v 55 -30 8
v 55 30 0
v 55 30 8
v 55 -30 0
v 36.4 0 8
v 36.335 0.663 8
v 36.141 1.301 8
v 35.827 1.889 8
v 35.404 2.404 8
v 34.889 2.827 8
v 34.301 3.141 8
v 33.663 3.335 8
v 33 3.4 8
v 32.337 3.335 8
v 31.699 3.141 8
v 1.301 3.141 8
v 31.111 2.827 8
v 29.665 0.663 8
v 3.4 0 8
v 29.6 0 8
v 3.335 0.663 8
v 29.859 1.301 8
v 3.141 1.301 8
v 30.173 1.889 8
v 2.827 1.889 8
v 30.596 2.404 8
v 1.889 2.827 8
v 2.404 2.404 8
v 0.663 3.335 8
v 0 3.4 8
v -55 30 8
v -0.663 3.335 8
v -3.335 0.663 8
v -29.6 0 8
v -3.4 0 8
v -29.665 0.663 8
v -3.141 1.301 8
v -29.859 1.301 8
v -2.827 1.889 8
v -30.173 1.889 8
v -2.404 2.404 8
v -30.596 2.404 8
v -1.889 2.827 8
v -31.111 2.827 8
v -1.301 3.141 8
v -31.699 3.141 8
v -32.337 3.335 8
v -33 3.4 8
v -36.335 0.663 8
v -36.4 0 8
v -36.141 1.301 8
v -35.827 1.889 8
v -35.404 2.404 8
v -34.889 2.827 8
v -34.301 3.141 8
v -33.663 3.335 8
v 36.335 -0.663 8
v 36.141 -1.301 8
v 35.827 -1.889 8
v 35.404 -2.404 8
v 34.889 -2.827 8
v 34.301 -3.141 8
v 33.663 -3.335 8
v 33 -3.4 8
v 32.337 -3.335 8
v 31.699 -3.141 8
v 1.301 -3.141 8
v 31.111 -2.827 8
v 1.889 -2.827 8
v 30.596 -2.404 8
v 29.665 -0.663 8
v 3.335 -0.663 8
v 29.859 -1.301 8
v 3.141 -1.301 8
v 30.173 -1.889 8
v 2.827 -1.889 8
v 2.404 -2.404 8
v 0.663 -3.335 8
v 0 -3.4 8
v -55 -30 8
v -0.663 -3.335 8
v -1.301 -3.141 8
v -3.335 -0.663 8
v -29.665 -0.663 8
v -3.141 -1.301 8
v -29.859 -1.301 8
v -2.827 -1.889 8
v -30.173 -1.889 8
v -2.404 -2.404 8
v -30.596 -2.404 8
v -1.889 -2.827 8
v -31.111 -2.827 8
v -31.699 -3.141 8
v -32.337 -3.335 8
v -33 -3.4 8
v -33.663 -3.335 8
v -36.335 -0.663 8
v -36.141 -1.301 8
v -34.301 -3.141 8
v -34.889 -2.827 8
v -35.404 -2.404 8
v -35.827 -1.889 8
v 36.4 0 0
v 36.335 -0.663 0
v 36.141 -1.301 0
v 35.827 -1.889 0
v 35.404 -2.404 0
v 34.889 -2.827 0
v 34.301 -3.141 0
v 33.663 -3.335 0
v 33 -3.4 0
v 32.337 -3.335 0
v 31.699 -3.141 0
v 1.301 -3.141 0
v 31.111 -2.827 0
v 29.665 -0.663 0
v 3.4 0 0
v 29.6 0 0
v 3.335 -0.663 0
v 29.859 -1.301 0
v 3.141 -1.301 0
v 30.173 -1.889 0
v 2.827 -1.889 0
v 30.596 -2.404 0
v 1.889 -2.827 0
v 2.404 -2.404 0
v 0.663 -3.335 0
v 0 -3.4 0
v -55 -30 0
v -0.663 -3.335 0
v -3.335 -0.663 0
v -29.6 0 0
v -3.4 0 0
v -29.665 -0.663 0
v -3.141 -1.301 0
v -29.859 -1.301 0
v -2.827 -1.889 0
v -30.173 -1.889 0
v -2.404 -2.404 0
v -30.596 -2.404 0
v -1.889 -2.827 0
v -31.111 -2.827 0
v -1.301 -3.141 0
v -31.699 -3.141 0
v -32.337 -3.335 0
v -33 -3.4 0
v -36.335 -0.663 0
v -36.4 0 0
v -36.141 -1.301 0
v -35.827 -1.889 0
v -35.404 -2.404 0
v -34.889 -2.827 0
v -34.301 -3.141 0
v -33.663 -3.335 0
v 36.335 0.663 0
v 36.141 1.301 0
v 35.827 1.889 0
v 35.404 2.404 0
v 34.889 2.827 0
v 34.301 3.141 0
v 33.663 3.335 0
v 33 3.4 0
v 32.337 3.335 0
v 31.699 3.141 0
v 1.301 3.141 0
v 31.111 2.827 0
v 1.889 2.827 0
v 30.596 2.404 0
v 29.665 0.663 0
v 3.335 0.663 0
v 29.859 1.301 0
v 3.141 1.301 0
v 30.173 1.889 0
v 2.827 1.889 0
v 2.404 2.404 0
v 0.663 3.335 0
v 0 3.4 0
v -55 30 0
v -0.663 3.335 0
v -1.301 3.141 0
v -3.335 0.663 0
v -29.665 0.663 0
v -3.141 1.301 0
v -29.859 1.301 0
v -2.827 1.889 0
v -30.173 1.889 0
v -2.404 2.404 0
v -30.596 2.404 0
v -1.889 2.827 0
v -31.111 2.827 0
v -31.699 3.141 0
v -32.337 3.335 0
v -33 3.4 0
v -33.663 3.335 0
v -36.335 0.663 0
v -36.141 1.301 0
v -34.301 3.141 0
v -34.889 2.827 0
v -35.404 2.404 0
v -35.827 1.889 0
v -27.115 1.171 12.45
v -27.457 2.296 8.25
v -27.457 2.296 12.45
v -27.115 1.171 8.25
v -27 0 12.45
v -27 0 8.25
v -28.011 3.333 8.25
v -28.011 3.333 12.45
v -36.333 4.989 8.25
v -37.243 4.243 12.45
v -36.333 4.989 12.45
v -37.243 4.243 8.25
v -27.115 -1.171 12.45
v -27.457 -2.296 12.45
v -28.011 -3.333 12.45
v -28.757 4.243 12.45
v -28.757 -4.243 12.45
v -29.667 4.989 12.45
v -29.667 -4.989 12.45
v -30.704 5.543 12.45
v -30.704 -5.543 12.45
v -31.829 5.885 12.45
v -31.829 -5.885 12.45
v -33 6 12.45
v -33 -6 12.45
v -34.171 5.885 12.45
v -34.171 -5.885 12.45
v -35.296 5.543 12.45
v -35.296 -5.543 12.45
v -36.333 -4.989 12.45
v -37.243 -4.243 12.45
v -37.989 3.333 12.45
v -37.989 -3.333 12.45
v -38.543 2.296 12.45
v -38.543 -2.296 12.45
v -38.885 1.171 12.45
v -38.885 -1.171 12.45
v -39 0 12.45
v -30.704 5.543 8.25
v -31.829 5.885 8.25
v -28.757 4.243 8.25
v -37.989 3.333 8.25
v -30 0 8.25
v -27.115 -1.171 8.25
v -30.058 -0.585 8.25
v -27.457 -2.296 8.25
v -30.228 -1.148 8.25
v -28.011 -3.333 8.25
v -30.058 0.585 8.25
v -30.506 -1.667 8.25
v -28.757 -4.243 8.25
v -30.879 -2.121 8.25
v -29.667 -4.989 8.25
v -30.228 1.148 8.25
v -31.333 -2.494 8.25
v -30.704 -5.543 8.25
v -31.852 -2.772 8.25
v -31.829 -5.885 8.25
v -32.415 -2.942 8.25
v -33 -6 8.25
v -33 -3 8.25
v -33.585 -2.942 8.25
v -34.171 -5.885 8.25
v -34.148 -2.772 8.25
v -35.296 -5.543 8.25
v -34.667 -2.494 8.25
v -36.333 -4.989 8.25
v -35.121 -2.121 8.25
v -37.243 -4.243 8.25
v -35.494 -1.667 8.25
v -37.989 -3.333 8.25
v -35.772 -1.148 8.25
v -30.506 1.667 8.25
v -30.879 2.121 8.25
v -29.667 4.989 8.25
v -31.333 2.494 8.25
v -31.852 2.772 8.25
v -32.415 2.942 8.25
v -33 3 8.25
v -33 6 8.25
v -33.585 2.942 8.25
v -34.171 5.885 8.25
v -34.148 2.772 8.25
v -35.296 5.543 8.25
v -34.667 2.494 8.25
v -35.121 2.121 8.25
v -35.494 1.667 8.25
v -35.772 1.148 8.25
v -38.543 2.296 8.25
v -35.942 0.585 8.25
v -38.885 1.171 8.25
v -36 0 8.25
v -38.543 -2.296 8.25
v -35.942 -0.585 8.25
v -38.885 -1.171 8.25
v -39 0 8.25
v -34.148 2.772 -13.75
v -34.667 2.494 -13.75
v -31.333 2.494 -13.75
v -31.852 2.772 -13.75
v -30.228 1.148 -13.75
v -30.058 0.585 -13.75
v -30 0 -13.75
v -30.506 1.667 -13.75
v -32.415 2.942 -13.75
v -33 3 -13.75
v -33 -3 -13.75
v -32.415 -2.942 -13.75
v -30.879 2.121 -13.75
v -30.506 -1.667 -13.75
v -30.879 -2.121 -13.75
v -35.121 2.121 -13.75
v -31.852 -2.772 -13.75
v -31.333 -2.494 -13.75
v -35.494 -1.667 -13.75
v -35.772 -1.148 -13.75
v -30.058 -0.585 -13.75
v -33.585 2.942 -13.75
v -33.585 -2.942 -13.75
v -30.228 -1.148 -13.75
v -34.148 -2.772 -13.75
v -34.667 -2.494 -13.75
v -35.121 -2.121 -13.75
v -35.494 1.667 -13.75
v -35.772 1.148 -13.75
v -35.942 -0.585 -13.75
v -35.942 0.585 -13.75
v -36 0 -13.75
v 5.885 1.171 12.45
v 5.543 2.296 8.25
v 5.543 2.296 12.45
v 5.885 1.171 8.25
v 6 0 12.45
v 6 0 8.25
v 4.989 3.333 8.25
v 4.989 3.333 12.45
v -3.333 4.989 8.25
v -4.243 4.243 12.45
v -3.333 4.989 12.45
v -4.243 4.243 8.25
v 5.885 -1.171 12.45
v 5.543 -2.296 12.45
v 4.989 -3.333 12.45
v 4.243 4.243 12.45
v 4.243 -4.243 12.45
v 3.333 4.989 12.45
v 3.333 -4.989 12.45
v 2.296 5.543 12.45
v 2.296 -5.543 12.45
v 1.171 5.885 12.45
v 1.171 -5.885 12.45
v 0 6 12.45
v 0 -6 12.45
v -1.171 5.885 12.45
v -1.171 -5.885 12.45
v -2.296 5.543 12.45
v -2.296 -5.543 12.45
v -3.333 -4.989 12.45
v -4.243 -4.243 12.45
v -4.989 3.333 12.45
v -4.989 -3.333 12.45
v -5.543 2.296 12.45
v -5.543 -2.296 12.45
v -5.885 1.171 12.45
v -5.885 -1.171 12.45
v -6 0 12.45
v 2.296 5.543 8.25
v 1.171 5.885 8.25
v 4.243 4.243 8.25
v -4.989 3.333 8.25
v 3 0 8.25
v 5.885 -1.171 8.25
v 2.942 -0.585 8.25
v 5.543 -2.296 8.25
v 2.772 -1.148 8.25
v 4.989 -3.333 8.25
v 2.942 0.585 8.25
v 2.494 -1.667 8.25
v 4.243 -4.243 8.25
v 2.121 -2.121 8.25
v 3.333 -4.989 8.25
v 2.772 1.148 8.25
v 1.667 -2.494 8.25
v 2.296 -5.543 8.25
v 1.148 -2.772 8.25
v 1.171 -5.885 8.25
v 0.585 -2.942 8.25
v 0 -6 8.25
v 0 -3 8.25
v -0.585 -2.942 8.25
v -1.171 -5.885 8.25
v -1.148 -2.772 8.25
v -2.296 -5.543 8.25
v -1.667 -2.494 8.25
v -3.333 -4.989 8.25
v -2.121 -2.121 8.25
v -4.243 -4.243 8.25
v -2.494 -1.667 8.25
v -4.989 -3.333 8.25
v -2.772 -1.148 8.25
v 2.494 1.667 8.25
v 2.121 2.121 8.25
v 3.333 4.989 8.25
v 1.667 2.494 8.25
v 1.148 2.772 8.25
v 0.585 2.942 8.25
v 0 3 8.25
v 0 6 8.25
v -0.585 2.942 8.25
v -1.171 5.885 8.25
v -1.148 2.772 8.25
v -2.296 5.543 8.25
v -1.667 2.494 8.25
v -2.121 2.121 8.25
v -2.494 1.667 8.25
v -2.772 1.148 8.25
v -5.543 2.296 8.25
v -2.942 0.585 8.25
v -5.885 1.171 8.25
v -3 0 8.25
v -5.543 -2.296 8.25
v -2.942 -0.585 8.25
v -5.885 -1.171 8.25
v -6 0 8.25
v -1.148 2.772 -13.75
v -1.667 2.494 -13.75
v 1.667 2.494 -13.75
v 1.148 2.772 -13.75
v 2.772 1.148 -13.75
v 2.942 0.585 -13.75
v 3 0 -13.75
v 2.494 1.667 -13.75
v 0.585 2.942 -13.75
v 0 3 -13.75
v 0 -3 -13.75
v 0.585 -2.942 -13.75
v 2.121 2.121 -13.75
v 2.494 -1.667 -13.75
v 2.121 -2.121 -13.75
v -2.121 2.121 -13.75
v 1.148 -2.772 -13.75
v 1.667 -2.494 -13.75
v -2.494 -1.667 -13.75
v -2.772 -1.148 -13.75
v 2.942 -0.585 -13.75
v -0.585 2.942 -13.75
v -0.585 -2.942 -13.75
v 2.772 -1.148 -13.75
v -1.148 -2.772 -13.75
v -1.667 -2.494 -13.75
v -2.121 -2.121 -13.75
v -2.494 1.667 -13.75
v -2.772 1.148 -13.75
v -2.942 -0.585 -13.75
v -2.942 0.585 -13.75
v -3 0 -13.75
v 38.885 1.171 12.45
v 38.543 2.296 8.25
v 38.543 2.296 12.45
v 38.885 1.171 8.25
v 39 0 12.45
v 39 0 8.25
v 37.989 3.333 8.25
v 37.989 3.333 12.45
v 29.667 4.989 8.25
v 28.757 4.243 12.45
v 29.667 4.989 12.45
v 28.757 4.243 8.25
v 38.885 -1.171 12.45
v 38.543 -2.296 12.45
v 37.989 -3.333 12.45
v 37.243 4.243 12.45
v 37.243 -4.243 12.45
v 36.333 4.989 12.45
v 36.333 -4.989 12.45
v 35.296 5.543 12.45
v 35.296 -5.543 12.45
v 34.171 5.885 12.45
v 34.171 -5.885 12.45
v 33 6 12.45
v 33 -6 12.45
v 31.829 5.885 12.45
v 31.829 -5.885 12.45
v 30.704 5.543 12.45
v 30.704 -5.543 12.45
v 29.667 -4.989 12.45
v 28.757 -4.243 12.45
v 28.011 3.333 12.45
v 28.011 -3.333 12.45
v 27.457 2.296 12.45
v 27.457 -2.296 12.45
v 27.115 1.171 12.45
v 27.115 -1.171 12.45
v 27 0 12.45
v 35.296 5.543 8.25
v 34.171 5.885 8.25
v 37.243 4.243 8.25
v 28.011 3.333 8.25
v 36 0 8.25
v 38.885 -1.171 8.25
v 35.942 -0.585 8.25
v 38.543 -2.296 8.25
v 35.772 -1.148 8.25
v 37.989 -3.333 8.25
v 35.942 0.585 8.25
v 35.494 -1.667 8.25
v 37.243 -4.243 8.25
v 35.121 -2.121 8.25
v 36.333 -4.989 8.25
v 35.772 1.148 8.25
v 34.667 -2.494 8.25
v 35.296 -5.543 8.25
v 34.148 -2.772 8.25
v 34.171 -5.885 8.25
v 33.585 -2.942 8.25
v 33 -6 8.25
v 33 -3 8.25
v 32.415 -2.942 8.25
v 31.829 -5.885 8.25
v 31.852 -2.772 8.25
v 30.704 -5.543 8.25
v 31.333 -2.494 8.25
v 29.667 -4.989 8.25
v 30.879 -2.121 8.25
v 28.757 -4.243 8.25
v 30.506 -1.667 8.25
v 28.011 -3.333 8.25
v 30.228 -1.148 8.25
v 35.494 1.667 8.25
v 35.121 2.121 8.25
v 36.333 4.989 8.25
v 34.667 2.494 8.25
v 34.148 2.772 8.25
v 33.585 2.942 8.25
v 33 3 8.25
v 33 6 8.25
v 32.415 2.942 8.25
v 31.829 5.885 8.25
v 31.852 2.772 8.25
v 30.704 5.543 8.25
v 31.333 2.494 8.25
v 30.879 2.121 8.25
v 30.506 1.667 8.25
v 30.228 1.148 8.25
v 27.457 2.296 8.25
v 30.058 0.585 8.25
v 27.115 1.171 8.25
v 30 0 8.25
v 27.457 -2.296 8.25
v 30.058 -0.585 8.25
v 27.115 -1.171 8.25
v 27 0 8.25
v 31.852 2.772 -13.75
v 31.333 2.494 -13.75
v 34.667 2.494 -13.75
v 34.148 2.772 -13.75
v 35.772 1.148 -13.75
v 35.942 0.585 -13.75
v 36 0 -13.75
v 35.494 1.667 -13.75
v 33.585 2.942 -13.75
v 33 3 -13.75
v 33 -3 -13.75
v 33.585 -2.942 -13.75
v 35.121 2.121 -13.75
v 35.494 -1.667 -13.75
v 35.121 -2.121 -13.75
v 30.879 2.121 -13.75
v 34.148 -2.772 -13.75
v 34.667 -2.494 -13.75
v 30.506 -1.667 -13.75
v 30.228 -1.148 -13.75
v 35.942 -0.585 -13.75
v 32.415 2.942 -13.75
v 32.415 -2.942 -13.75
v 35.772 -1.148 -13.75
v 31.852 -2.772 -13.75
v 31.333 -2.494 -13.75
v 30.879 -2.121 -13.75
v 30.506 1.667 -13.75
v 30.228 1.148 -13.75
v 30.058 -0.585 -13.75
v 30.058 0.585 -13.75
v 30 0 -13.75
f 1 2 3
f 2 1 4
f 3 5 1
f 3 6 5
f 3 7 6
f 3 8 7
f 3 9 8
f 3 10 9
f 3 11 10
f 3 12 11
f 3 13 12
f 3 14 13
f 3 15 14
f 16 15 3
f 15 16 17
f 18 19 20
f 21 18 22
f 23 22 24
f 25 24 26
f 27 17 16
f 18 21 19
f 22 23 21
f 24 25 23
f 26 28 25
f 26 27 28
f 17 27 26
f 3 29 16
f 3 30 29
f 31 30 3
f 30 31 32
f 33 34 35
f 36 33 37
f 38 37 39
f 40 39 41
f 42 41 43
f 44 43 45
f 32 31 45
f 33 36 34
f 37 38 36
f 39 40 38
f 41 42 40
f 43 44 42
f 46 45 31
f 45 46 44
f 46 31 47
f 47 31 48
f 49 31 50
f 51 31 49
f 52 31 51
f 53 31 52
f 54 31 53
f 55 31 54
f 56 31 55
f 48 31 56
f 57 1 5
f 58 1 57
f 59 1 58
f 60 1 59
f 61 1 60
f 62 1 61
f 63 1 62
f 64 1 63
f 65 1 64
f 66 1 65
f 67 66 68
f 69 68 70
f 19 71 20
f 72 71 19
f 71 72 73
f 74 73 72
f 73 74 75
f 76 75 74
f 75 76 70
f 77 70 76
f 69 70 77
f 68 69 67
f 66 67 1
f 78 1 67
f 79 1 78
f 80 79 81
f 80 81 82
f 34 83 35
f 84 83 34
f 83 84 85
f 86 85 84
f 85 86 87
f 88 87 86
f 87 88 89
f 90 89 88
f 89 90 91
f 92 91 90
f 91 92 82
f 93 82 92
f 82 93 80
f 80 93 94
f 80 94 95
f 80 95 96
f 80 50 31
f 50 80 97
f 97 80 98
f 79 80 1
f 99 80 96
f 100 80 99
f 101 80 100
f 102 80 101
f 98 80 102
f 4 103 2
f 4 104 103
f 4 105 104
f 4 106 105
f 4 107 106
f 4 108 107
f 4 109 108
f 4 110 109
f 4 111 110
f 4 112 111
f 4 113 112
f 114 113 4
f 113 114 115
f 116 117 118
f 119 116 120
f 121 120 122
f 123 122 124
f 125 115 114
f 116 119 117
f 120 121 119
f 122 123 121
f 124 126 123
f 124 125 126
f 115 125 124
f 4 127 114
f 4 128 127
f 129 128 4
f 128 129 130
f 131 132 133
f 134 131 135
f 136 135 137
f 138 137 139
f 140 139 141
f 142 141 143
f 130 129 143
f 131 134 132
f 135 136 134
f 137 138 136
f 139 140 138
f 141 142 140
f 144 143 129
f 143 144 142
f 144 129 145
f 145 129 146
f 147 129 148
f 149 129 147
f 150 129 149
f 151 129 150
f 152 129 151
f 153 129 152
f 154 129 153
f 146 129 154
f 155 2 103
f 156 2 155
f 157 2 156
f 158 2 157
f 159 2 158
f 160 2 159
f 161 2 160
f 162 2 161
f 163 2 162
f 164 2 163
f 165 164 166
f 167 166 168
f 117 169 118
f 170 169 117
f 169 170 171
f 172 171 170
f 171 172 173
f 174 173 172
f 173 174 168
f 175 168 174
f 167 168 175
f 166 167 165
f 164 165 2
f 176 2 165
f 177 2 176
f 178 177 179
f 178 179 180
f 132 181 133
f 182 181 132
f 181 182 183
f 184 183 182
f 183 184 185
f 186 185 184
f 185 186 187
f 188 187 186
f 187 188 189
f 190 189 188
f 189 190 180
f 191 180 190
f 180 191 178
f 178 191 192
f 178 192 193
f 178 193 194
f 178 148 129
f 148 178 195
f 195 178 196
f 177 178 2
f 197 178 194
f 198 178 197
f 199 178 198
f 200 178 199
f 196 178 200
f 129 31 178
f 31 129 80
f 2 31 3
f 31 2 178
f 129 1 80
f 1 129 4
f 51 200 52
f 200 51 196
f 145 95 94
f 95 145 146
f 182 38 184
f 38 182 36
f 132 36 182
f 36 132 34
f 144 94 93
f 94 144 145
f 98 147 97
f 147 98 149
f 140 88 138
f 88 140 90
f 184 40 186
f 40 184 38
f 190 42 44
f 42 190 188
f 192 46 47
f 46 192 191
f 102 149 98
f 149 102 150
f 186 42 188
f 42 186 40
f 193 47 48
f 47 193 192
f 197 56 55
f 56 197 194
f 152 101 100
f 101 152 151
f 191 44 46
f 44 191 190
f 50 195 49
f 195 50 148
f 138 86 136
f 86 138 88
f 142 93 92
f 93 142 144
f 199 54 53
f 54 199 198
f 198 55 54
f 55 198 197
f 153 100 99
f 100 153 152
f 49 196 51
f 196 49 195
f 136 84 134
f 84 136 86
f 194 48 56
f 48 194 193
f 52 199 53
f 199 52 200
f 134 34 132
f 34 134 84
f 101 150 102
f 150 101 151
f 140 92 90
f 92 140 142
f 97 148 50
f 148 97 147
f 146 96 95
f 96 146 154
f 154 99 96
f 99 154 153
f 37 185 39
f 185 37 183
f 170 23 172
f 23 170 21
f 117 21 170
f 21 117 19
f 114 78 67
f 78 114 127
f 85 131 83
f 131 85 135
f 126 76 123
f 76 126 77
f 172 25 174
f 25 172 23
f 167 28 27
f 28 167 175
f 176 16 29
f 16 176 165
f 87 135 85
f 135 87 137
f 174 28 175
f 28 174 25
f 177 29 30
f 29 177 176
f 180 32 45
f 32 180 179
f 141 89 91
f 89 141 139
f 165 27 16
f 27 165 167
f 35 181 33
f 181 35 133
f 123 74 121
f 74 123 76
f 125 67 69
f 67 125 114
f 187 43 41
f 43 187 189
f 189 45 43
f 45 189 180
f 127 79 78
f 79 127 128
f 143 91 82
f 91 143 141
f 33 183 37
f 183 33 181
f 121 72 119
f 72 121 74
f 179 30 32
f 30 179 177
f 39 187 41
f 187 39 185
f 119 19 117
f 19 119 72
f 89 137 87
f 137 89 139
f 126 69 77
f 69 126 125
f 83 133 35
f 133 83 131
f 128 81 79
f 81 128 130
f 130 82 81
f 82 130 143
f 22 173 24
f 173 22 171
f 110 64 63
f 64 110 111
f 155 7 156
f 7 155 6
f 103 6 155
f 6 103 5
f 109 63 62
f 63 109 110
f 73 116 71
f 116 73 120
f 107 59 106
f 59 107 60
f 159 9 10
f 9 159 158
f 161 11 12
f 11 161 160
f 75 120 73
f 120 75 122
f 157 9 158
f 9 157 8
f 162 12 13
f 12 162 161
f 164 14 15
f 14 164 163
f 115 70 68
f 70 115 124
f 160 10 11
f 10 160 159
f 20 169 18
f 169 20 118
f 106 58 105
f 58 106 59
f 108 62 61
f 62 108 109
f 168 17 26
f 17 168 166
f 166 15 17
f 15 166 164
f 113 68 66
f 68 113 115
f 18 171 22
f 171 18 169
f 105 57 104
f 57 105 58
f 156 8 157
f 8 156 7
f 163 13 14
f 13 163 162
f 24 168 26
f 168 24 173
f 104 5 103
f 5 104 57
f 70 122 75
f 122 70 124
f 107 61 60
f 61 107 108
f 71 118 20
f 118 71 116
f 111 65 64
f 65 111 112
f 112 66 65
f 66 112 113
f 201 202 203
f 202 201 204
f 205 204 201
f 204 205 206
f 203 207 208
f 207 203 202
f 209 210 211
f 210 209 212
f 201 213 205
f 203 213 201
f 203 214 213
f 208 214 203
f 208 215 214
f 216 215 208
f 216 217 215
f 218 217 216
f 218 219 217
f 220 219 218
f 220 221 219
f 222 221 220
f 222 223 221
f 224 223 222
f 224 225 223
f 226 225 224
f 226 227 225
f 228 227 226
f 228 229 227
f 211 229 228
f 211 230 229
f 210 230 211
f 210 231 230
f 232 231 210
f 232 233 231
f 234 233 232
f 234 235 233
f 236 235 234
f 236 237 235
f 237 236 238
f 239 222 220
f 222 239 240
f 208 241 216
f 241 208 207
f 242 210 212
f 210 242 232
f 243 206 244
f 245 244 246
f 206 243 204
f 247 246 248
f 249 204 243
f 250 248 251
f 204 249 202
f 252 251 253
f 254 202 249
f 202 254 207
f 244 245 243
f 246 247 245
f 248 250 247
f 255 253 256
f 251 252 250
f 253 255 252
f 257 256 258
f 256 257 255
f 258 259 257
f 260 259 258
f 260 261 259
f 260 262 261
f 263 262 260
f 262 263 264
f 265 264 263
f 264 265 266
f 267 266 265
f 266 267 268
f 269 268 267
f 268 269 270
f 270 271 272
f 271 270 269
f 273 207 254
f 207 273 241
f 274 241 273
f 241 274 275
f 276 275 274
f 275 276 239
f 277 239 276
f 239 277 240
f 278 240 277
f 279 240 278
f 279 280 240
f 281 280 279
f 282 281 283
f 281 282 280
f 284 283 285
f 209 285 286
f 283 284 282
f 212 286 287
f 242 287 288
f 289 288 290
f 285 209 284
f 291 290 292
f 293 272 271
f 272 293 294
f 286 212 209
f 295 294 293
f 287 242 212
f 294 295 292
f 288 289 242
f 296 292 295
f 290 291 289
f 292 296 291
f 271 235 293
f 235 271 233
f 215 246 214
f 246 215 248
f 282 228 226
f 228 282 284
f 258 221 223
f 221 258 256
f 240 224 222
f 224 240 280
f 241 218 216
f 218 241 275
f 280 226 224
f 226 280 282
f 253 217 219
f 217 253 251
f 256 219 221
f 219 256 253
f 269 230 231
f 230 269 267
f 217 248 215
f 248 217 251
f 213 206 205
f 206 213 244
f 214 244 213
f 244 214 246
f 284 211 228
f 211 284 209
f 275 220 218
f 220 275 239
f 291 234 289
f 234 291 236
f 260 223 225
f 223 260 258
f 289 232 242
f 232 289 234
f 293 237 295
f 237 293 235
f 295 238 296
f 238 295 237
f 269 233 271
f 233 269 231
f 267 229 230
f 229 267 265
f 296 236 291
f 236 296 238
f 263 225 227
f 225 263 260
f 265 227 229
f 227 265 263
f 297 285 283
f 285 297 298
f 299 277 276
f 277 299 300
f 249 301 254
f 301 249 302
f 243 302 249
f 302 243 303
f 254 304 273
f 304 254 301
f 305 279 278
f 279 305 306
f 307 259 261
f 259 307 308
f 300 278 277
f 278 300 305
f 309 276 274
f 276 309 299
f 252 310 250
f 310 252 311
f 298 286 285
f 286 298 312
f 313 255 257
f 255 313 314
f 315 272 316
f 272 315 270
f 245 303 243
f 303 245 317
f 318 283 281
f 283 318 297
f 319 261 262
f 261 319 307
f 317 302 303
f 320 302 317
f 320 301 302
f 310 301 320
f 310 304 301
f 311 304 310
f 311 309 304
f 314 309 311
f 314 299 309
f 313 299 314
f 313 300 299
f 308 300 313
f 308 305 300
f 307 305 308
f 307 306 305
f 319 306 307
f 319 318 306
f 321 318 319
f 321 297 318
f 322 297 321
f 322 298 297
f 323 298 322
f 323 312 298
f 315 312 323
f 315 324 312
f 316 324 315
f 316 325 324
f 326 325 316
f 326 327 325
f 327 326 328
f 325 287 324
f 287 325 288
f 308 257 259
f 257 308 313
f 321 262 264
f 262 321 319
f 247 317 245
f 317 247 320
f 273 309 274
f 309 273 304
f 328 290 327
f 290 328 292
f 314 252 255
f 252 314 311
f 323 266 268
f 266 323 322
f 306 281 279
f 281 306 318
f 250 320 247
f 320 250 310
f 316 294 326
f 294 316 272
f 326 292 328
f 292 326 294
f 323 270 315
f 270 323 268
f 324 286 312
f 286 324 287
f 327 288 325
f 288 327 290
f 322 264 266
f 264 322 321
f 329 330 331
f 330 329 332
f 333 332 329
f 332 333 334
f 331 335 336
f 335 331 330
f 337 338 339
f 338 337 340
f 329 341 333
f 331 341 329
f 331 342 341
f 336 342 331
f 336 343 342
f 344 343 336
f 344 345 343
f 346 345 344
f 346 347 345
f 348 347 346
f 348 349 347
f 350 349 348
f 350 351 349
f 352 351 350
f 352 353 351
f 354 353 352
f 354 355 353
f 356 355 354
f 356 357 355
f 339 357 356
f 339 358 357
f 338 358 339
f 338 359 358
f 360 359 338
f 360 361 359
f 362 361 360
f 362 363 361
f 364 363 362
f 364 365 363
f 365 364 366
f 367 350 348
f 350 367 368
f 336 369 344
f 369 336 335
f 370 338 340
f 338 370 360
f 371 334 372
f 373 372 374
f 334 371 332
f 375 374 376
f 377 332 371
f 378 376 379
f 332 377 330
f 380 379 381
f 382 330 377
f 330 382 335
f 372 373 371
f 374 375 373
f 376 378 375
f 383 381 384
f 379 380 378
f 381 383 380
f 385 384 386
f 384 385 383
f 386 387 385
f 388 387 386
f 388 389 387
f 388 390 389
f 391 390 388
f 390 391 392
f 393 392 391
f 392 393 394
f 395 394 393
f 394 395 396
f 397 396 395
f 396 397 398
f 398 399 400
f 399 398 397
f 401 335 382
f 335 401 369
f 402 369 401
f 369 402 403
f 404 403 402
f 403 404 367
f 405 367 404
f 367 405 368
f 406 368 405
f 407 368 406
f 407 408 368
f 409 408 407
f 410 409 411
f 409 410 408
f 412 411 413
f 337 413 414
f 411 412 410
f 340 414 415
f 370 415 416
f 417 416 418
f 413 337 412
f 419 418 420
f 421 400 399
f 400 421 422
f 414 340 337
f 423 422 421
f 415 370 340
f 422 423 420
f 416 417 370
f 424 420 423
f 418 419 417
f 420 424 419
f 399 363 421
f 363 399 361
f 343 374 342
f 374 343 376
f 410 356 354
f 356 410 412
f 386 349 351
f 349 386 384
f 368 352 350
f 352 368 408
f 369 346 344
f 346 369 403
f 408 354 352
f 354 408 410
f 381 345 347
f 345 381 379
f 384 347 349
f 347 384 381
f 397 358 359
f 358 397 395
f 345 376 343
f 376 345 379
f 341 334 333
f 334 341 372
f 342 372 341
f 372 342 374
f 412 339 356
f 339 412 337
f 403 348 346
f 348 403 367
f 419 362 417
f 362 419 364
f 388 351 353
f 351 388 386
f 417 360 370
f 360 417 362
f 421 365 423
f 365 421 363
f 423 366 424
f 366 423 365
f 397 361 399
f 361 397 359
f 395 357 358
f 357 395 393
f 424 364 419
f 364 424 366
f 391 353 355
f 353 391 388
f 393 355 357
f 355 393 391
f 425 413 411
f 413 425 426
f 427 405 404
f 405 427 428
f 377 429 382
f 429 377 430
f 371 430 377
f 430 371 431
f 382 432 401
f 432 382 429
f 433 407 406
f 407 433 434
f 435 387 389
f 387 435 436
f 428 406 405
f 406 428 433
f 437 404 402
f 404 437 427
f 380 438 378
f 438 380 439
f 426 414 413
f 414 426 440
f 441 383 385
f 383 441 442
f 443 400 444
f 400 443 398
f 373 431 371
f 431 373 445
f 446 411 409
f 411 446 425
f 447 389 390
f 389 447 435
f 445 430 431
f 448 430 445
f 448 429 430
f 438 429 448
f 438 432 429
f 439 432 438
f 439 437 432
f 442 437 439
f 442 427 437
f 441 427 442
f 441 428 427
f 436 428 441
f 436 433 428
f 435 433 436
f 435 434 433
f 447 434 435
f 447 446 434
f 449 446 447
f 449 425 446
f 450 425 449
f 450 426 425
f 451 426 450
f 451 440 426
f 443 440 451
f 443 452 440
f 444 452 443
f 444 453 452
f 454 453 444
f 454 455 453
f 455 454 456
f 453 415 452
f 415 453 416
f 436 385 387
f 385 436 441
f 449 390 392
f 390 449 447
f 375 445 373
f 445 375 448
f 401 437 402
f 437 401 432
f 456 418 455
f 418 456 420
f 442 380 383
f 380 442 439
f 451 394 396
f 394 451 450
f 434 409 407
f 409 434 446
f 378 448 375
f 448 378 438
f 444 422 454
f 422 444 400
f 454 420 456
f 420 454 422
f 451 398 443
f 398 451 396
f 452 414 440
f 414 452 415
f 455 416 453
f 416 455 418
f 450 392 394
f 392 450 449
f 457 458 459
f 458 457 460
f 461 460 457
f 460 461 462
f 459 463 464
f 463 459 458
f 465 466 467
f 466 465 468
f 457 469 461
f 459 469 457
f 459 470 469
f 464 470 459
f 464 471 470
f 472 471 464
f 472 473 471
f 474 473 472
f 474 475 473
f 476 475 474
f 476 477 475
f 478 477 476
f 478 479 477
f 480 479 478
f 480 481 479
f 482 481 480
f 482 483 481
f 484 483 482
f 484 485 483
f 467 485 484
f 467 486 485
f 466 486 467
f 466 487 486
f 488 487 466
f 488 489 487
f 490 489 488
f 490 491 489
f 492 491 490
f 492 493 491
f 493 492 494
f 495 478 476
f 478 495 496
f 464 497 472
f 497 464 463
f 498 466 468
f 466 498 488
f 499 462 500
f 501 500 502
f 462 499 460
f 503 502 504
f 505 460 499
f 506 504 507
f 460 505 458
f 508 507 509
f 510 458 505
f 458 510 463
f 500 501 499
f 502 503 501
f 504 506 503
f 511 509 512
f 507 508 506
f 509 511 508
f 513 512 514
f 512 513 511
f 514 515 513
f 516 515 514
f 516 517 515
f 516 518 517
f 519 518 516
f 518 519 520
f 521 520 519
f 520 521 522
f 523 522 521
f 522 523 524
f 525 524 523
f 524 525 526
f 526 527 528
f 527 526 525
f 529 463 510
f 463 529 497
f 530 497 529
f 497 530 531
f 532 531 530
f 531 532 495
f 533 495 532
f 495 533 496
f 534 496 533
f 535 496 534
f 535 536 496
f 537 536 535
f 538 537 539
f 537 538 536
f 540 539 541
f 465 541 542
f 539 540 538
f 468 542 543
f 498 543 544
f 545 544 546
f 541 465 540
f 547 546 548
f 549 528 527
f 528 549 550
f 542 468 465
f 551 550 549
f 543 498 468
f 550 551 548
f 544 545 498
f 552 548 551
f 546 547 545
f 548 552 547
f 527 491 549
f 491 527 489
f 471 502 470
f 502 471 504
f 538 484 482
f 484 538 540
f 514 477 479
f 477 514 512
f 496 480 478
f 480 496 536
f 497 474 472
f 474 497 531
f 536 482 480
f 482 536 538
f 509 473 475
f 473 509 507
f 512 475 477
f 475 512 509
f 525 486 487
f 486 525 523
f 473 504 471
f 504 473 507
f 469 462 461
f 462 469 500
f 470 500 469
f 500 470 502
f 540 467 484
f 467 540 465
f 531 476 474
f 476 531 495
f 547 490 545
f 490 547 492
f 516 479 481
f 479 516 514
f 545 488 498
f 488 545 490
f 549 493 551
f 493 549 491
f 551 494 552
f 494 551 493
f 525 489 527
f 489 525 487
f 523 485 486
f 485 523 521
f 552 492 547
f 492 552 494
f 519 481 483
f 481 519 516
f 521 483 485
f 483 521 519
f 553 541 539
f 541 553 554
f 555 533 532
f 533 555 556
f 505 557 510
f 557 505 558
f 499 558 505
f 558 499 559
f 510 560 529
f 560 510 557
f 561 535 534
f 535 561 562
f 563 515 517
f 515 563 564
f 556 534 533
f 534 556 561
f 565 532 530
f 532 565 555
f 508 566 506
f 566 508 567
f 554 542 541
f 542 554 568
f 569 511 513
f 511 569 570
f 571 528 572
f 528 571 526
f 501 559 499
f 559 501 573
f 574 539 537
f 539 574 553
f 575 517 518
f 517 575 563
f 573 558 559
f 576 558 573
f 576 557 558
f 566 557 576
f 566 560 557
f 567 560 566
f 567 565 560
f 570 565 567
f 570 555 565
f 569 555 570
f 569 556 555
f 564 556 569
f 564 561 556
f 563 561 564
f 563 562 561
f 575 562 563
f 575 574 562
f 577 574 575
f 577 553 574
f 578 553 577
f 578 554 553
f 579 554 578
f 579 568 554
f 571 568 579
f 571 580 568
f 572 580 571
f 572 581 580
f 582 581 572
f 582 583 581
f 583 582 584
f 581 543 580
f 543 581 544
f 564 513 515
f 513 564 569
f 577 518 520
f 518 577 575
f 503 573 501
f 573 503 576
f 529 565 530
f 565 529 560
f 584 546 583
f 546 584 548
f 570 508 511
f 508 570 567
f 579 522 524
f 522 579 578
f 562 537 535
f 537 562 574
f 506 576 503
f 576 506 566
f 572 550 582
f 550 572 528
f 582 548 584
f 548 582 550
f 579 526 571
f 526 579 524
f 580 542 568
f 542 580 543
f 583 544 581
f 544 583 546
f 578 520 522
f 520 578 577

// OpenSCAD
$fn = 32;

// ------------------------------------------------------------------------
// Bolted plate: 110 x 60 x 8 mm plate, 3 fasteners
// Every part is its own module, assembly() places them once.
// ------------------------------------------------------------------------

// --- part 1 ---
module plate() {
  difference() {
    translate([-55, -30, 0]) cube([110, 60, 8]);
    translate([-33, 0, -1]) cylinder(h = 10, d = 6.8);
    translate([0, 0, -1]) cylinder(h = 10, d = 6.8);
    translate([33, 0, -1]) cylinder(h = 10, d = 6.8);
  }
}

// --- part 2 ---
module bolt1() {
  cylinder(h = 4.2, d = 12);
  translate([0, 0, -22]) cylinder(h = 22, d = 6);
}

// --- part 3 ---
module bolt2() {
  cylinder(h = 4.2, d = 12);
  translate([0, 0, -22]) cylinder(h = 22, d = 6);
}

// --- part 4 ---
module bolt3() {
  cylinder(h = 4.2, d = 12);
  translate([0, 0, -22]) cylinder(h = 22, d = 6);
}

// --- assembly ---
module assembly() {
  translate([0, 0, 0]) rotate([0, 0, 0]) plate();
  translate([-33, 0, 8.25]) rotate([0, 0, 0]) bolt1();
  translate([0, 0, 8.25]) rotate([0, 0, 0]) bolt2();
  translate([33, 0, 8.25]) rotate([0, 0, 0]) bolt3();
}

assembly();
